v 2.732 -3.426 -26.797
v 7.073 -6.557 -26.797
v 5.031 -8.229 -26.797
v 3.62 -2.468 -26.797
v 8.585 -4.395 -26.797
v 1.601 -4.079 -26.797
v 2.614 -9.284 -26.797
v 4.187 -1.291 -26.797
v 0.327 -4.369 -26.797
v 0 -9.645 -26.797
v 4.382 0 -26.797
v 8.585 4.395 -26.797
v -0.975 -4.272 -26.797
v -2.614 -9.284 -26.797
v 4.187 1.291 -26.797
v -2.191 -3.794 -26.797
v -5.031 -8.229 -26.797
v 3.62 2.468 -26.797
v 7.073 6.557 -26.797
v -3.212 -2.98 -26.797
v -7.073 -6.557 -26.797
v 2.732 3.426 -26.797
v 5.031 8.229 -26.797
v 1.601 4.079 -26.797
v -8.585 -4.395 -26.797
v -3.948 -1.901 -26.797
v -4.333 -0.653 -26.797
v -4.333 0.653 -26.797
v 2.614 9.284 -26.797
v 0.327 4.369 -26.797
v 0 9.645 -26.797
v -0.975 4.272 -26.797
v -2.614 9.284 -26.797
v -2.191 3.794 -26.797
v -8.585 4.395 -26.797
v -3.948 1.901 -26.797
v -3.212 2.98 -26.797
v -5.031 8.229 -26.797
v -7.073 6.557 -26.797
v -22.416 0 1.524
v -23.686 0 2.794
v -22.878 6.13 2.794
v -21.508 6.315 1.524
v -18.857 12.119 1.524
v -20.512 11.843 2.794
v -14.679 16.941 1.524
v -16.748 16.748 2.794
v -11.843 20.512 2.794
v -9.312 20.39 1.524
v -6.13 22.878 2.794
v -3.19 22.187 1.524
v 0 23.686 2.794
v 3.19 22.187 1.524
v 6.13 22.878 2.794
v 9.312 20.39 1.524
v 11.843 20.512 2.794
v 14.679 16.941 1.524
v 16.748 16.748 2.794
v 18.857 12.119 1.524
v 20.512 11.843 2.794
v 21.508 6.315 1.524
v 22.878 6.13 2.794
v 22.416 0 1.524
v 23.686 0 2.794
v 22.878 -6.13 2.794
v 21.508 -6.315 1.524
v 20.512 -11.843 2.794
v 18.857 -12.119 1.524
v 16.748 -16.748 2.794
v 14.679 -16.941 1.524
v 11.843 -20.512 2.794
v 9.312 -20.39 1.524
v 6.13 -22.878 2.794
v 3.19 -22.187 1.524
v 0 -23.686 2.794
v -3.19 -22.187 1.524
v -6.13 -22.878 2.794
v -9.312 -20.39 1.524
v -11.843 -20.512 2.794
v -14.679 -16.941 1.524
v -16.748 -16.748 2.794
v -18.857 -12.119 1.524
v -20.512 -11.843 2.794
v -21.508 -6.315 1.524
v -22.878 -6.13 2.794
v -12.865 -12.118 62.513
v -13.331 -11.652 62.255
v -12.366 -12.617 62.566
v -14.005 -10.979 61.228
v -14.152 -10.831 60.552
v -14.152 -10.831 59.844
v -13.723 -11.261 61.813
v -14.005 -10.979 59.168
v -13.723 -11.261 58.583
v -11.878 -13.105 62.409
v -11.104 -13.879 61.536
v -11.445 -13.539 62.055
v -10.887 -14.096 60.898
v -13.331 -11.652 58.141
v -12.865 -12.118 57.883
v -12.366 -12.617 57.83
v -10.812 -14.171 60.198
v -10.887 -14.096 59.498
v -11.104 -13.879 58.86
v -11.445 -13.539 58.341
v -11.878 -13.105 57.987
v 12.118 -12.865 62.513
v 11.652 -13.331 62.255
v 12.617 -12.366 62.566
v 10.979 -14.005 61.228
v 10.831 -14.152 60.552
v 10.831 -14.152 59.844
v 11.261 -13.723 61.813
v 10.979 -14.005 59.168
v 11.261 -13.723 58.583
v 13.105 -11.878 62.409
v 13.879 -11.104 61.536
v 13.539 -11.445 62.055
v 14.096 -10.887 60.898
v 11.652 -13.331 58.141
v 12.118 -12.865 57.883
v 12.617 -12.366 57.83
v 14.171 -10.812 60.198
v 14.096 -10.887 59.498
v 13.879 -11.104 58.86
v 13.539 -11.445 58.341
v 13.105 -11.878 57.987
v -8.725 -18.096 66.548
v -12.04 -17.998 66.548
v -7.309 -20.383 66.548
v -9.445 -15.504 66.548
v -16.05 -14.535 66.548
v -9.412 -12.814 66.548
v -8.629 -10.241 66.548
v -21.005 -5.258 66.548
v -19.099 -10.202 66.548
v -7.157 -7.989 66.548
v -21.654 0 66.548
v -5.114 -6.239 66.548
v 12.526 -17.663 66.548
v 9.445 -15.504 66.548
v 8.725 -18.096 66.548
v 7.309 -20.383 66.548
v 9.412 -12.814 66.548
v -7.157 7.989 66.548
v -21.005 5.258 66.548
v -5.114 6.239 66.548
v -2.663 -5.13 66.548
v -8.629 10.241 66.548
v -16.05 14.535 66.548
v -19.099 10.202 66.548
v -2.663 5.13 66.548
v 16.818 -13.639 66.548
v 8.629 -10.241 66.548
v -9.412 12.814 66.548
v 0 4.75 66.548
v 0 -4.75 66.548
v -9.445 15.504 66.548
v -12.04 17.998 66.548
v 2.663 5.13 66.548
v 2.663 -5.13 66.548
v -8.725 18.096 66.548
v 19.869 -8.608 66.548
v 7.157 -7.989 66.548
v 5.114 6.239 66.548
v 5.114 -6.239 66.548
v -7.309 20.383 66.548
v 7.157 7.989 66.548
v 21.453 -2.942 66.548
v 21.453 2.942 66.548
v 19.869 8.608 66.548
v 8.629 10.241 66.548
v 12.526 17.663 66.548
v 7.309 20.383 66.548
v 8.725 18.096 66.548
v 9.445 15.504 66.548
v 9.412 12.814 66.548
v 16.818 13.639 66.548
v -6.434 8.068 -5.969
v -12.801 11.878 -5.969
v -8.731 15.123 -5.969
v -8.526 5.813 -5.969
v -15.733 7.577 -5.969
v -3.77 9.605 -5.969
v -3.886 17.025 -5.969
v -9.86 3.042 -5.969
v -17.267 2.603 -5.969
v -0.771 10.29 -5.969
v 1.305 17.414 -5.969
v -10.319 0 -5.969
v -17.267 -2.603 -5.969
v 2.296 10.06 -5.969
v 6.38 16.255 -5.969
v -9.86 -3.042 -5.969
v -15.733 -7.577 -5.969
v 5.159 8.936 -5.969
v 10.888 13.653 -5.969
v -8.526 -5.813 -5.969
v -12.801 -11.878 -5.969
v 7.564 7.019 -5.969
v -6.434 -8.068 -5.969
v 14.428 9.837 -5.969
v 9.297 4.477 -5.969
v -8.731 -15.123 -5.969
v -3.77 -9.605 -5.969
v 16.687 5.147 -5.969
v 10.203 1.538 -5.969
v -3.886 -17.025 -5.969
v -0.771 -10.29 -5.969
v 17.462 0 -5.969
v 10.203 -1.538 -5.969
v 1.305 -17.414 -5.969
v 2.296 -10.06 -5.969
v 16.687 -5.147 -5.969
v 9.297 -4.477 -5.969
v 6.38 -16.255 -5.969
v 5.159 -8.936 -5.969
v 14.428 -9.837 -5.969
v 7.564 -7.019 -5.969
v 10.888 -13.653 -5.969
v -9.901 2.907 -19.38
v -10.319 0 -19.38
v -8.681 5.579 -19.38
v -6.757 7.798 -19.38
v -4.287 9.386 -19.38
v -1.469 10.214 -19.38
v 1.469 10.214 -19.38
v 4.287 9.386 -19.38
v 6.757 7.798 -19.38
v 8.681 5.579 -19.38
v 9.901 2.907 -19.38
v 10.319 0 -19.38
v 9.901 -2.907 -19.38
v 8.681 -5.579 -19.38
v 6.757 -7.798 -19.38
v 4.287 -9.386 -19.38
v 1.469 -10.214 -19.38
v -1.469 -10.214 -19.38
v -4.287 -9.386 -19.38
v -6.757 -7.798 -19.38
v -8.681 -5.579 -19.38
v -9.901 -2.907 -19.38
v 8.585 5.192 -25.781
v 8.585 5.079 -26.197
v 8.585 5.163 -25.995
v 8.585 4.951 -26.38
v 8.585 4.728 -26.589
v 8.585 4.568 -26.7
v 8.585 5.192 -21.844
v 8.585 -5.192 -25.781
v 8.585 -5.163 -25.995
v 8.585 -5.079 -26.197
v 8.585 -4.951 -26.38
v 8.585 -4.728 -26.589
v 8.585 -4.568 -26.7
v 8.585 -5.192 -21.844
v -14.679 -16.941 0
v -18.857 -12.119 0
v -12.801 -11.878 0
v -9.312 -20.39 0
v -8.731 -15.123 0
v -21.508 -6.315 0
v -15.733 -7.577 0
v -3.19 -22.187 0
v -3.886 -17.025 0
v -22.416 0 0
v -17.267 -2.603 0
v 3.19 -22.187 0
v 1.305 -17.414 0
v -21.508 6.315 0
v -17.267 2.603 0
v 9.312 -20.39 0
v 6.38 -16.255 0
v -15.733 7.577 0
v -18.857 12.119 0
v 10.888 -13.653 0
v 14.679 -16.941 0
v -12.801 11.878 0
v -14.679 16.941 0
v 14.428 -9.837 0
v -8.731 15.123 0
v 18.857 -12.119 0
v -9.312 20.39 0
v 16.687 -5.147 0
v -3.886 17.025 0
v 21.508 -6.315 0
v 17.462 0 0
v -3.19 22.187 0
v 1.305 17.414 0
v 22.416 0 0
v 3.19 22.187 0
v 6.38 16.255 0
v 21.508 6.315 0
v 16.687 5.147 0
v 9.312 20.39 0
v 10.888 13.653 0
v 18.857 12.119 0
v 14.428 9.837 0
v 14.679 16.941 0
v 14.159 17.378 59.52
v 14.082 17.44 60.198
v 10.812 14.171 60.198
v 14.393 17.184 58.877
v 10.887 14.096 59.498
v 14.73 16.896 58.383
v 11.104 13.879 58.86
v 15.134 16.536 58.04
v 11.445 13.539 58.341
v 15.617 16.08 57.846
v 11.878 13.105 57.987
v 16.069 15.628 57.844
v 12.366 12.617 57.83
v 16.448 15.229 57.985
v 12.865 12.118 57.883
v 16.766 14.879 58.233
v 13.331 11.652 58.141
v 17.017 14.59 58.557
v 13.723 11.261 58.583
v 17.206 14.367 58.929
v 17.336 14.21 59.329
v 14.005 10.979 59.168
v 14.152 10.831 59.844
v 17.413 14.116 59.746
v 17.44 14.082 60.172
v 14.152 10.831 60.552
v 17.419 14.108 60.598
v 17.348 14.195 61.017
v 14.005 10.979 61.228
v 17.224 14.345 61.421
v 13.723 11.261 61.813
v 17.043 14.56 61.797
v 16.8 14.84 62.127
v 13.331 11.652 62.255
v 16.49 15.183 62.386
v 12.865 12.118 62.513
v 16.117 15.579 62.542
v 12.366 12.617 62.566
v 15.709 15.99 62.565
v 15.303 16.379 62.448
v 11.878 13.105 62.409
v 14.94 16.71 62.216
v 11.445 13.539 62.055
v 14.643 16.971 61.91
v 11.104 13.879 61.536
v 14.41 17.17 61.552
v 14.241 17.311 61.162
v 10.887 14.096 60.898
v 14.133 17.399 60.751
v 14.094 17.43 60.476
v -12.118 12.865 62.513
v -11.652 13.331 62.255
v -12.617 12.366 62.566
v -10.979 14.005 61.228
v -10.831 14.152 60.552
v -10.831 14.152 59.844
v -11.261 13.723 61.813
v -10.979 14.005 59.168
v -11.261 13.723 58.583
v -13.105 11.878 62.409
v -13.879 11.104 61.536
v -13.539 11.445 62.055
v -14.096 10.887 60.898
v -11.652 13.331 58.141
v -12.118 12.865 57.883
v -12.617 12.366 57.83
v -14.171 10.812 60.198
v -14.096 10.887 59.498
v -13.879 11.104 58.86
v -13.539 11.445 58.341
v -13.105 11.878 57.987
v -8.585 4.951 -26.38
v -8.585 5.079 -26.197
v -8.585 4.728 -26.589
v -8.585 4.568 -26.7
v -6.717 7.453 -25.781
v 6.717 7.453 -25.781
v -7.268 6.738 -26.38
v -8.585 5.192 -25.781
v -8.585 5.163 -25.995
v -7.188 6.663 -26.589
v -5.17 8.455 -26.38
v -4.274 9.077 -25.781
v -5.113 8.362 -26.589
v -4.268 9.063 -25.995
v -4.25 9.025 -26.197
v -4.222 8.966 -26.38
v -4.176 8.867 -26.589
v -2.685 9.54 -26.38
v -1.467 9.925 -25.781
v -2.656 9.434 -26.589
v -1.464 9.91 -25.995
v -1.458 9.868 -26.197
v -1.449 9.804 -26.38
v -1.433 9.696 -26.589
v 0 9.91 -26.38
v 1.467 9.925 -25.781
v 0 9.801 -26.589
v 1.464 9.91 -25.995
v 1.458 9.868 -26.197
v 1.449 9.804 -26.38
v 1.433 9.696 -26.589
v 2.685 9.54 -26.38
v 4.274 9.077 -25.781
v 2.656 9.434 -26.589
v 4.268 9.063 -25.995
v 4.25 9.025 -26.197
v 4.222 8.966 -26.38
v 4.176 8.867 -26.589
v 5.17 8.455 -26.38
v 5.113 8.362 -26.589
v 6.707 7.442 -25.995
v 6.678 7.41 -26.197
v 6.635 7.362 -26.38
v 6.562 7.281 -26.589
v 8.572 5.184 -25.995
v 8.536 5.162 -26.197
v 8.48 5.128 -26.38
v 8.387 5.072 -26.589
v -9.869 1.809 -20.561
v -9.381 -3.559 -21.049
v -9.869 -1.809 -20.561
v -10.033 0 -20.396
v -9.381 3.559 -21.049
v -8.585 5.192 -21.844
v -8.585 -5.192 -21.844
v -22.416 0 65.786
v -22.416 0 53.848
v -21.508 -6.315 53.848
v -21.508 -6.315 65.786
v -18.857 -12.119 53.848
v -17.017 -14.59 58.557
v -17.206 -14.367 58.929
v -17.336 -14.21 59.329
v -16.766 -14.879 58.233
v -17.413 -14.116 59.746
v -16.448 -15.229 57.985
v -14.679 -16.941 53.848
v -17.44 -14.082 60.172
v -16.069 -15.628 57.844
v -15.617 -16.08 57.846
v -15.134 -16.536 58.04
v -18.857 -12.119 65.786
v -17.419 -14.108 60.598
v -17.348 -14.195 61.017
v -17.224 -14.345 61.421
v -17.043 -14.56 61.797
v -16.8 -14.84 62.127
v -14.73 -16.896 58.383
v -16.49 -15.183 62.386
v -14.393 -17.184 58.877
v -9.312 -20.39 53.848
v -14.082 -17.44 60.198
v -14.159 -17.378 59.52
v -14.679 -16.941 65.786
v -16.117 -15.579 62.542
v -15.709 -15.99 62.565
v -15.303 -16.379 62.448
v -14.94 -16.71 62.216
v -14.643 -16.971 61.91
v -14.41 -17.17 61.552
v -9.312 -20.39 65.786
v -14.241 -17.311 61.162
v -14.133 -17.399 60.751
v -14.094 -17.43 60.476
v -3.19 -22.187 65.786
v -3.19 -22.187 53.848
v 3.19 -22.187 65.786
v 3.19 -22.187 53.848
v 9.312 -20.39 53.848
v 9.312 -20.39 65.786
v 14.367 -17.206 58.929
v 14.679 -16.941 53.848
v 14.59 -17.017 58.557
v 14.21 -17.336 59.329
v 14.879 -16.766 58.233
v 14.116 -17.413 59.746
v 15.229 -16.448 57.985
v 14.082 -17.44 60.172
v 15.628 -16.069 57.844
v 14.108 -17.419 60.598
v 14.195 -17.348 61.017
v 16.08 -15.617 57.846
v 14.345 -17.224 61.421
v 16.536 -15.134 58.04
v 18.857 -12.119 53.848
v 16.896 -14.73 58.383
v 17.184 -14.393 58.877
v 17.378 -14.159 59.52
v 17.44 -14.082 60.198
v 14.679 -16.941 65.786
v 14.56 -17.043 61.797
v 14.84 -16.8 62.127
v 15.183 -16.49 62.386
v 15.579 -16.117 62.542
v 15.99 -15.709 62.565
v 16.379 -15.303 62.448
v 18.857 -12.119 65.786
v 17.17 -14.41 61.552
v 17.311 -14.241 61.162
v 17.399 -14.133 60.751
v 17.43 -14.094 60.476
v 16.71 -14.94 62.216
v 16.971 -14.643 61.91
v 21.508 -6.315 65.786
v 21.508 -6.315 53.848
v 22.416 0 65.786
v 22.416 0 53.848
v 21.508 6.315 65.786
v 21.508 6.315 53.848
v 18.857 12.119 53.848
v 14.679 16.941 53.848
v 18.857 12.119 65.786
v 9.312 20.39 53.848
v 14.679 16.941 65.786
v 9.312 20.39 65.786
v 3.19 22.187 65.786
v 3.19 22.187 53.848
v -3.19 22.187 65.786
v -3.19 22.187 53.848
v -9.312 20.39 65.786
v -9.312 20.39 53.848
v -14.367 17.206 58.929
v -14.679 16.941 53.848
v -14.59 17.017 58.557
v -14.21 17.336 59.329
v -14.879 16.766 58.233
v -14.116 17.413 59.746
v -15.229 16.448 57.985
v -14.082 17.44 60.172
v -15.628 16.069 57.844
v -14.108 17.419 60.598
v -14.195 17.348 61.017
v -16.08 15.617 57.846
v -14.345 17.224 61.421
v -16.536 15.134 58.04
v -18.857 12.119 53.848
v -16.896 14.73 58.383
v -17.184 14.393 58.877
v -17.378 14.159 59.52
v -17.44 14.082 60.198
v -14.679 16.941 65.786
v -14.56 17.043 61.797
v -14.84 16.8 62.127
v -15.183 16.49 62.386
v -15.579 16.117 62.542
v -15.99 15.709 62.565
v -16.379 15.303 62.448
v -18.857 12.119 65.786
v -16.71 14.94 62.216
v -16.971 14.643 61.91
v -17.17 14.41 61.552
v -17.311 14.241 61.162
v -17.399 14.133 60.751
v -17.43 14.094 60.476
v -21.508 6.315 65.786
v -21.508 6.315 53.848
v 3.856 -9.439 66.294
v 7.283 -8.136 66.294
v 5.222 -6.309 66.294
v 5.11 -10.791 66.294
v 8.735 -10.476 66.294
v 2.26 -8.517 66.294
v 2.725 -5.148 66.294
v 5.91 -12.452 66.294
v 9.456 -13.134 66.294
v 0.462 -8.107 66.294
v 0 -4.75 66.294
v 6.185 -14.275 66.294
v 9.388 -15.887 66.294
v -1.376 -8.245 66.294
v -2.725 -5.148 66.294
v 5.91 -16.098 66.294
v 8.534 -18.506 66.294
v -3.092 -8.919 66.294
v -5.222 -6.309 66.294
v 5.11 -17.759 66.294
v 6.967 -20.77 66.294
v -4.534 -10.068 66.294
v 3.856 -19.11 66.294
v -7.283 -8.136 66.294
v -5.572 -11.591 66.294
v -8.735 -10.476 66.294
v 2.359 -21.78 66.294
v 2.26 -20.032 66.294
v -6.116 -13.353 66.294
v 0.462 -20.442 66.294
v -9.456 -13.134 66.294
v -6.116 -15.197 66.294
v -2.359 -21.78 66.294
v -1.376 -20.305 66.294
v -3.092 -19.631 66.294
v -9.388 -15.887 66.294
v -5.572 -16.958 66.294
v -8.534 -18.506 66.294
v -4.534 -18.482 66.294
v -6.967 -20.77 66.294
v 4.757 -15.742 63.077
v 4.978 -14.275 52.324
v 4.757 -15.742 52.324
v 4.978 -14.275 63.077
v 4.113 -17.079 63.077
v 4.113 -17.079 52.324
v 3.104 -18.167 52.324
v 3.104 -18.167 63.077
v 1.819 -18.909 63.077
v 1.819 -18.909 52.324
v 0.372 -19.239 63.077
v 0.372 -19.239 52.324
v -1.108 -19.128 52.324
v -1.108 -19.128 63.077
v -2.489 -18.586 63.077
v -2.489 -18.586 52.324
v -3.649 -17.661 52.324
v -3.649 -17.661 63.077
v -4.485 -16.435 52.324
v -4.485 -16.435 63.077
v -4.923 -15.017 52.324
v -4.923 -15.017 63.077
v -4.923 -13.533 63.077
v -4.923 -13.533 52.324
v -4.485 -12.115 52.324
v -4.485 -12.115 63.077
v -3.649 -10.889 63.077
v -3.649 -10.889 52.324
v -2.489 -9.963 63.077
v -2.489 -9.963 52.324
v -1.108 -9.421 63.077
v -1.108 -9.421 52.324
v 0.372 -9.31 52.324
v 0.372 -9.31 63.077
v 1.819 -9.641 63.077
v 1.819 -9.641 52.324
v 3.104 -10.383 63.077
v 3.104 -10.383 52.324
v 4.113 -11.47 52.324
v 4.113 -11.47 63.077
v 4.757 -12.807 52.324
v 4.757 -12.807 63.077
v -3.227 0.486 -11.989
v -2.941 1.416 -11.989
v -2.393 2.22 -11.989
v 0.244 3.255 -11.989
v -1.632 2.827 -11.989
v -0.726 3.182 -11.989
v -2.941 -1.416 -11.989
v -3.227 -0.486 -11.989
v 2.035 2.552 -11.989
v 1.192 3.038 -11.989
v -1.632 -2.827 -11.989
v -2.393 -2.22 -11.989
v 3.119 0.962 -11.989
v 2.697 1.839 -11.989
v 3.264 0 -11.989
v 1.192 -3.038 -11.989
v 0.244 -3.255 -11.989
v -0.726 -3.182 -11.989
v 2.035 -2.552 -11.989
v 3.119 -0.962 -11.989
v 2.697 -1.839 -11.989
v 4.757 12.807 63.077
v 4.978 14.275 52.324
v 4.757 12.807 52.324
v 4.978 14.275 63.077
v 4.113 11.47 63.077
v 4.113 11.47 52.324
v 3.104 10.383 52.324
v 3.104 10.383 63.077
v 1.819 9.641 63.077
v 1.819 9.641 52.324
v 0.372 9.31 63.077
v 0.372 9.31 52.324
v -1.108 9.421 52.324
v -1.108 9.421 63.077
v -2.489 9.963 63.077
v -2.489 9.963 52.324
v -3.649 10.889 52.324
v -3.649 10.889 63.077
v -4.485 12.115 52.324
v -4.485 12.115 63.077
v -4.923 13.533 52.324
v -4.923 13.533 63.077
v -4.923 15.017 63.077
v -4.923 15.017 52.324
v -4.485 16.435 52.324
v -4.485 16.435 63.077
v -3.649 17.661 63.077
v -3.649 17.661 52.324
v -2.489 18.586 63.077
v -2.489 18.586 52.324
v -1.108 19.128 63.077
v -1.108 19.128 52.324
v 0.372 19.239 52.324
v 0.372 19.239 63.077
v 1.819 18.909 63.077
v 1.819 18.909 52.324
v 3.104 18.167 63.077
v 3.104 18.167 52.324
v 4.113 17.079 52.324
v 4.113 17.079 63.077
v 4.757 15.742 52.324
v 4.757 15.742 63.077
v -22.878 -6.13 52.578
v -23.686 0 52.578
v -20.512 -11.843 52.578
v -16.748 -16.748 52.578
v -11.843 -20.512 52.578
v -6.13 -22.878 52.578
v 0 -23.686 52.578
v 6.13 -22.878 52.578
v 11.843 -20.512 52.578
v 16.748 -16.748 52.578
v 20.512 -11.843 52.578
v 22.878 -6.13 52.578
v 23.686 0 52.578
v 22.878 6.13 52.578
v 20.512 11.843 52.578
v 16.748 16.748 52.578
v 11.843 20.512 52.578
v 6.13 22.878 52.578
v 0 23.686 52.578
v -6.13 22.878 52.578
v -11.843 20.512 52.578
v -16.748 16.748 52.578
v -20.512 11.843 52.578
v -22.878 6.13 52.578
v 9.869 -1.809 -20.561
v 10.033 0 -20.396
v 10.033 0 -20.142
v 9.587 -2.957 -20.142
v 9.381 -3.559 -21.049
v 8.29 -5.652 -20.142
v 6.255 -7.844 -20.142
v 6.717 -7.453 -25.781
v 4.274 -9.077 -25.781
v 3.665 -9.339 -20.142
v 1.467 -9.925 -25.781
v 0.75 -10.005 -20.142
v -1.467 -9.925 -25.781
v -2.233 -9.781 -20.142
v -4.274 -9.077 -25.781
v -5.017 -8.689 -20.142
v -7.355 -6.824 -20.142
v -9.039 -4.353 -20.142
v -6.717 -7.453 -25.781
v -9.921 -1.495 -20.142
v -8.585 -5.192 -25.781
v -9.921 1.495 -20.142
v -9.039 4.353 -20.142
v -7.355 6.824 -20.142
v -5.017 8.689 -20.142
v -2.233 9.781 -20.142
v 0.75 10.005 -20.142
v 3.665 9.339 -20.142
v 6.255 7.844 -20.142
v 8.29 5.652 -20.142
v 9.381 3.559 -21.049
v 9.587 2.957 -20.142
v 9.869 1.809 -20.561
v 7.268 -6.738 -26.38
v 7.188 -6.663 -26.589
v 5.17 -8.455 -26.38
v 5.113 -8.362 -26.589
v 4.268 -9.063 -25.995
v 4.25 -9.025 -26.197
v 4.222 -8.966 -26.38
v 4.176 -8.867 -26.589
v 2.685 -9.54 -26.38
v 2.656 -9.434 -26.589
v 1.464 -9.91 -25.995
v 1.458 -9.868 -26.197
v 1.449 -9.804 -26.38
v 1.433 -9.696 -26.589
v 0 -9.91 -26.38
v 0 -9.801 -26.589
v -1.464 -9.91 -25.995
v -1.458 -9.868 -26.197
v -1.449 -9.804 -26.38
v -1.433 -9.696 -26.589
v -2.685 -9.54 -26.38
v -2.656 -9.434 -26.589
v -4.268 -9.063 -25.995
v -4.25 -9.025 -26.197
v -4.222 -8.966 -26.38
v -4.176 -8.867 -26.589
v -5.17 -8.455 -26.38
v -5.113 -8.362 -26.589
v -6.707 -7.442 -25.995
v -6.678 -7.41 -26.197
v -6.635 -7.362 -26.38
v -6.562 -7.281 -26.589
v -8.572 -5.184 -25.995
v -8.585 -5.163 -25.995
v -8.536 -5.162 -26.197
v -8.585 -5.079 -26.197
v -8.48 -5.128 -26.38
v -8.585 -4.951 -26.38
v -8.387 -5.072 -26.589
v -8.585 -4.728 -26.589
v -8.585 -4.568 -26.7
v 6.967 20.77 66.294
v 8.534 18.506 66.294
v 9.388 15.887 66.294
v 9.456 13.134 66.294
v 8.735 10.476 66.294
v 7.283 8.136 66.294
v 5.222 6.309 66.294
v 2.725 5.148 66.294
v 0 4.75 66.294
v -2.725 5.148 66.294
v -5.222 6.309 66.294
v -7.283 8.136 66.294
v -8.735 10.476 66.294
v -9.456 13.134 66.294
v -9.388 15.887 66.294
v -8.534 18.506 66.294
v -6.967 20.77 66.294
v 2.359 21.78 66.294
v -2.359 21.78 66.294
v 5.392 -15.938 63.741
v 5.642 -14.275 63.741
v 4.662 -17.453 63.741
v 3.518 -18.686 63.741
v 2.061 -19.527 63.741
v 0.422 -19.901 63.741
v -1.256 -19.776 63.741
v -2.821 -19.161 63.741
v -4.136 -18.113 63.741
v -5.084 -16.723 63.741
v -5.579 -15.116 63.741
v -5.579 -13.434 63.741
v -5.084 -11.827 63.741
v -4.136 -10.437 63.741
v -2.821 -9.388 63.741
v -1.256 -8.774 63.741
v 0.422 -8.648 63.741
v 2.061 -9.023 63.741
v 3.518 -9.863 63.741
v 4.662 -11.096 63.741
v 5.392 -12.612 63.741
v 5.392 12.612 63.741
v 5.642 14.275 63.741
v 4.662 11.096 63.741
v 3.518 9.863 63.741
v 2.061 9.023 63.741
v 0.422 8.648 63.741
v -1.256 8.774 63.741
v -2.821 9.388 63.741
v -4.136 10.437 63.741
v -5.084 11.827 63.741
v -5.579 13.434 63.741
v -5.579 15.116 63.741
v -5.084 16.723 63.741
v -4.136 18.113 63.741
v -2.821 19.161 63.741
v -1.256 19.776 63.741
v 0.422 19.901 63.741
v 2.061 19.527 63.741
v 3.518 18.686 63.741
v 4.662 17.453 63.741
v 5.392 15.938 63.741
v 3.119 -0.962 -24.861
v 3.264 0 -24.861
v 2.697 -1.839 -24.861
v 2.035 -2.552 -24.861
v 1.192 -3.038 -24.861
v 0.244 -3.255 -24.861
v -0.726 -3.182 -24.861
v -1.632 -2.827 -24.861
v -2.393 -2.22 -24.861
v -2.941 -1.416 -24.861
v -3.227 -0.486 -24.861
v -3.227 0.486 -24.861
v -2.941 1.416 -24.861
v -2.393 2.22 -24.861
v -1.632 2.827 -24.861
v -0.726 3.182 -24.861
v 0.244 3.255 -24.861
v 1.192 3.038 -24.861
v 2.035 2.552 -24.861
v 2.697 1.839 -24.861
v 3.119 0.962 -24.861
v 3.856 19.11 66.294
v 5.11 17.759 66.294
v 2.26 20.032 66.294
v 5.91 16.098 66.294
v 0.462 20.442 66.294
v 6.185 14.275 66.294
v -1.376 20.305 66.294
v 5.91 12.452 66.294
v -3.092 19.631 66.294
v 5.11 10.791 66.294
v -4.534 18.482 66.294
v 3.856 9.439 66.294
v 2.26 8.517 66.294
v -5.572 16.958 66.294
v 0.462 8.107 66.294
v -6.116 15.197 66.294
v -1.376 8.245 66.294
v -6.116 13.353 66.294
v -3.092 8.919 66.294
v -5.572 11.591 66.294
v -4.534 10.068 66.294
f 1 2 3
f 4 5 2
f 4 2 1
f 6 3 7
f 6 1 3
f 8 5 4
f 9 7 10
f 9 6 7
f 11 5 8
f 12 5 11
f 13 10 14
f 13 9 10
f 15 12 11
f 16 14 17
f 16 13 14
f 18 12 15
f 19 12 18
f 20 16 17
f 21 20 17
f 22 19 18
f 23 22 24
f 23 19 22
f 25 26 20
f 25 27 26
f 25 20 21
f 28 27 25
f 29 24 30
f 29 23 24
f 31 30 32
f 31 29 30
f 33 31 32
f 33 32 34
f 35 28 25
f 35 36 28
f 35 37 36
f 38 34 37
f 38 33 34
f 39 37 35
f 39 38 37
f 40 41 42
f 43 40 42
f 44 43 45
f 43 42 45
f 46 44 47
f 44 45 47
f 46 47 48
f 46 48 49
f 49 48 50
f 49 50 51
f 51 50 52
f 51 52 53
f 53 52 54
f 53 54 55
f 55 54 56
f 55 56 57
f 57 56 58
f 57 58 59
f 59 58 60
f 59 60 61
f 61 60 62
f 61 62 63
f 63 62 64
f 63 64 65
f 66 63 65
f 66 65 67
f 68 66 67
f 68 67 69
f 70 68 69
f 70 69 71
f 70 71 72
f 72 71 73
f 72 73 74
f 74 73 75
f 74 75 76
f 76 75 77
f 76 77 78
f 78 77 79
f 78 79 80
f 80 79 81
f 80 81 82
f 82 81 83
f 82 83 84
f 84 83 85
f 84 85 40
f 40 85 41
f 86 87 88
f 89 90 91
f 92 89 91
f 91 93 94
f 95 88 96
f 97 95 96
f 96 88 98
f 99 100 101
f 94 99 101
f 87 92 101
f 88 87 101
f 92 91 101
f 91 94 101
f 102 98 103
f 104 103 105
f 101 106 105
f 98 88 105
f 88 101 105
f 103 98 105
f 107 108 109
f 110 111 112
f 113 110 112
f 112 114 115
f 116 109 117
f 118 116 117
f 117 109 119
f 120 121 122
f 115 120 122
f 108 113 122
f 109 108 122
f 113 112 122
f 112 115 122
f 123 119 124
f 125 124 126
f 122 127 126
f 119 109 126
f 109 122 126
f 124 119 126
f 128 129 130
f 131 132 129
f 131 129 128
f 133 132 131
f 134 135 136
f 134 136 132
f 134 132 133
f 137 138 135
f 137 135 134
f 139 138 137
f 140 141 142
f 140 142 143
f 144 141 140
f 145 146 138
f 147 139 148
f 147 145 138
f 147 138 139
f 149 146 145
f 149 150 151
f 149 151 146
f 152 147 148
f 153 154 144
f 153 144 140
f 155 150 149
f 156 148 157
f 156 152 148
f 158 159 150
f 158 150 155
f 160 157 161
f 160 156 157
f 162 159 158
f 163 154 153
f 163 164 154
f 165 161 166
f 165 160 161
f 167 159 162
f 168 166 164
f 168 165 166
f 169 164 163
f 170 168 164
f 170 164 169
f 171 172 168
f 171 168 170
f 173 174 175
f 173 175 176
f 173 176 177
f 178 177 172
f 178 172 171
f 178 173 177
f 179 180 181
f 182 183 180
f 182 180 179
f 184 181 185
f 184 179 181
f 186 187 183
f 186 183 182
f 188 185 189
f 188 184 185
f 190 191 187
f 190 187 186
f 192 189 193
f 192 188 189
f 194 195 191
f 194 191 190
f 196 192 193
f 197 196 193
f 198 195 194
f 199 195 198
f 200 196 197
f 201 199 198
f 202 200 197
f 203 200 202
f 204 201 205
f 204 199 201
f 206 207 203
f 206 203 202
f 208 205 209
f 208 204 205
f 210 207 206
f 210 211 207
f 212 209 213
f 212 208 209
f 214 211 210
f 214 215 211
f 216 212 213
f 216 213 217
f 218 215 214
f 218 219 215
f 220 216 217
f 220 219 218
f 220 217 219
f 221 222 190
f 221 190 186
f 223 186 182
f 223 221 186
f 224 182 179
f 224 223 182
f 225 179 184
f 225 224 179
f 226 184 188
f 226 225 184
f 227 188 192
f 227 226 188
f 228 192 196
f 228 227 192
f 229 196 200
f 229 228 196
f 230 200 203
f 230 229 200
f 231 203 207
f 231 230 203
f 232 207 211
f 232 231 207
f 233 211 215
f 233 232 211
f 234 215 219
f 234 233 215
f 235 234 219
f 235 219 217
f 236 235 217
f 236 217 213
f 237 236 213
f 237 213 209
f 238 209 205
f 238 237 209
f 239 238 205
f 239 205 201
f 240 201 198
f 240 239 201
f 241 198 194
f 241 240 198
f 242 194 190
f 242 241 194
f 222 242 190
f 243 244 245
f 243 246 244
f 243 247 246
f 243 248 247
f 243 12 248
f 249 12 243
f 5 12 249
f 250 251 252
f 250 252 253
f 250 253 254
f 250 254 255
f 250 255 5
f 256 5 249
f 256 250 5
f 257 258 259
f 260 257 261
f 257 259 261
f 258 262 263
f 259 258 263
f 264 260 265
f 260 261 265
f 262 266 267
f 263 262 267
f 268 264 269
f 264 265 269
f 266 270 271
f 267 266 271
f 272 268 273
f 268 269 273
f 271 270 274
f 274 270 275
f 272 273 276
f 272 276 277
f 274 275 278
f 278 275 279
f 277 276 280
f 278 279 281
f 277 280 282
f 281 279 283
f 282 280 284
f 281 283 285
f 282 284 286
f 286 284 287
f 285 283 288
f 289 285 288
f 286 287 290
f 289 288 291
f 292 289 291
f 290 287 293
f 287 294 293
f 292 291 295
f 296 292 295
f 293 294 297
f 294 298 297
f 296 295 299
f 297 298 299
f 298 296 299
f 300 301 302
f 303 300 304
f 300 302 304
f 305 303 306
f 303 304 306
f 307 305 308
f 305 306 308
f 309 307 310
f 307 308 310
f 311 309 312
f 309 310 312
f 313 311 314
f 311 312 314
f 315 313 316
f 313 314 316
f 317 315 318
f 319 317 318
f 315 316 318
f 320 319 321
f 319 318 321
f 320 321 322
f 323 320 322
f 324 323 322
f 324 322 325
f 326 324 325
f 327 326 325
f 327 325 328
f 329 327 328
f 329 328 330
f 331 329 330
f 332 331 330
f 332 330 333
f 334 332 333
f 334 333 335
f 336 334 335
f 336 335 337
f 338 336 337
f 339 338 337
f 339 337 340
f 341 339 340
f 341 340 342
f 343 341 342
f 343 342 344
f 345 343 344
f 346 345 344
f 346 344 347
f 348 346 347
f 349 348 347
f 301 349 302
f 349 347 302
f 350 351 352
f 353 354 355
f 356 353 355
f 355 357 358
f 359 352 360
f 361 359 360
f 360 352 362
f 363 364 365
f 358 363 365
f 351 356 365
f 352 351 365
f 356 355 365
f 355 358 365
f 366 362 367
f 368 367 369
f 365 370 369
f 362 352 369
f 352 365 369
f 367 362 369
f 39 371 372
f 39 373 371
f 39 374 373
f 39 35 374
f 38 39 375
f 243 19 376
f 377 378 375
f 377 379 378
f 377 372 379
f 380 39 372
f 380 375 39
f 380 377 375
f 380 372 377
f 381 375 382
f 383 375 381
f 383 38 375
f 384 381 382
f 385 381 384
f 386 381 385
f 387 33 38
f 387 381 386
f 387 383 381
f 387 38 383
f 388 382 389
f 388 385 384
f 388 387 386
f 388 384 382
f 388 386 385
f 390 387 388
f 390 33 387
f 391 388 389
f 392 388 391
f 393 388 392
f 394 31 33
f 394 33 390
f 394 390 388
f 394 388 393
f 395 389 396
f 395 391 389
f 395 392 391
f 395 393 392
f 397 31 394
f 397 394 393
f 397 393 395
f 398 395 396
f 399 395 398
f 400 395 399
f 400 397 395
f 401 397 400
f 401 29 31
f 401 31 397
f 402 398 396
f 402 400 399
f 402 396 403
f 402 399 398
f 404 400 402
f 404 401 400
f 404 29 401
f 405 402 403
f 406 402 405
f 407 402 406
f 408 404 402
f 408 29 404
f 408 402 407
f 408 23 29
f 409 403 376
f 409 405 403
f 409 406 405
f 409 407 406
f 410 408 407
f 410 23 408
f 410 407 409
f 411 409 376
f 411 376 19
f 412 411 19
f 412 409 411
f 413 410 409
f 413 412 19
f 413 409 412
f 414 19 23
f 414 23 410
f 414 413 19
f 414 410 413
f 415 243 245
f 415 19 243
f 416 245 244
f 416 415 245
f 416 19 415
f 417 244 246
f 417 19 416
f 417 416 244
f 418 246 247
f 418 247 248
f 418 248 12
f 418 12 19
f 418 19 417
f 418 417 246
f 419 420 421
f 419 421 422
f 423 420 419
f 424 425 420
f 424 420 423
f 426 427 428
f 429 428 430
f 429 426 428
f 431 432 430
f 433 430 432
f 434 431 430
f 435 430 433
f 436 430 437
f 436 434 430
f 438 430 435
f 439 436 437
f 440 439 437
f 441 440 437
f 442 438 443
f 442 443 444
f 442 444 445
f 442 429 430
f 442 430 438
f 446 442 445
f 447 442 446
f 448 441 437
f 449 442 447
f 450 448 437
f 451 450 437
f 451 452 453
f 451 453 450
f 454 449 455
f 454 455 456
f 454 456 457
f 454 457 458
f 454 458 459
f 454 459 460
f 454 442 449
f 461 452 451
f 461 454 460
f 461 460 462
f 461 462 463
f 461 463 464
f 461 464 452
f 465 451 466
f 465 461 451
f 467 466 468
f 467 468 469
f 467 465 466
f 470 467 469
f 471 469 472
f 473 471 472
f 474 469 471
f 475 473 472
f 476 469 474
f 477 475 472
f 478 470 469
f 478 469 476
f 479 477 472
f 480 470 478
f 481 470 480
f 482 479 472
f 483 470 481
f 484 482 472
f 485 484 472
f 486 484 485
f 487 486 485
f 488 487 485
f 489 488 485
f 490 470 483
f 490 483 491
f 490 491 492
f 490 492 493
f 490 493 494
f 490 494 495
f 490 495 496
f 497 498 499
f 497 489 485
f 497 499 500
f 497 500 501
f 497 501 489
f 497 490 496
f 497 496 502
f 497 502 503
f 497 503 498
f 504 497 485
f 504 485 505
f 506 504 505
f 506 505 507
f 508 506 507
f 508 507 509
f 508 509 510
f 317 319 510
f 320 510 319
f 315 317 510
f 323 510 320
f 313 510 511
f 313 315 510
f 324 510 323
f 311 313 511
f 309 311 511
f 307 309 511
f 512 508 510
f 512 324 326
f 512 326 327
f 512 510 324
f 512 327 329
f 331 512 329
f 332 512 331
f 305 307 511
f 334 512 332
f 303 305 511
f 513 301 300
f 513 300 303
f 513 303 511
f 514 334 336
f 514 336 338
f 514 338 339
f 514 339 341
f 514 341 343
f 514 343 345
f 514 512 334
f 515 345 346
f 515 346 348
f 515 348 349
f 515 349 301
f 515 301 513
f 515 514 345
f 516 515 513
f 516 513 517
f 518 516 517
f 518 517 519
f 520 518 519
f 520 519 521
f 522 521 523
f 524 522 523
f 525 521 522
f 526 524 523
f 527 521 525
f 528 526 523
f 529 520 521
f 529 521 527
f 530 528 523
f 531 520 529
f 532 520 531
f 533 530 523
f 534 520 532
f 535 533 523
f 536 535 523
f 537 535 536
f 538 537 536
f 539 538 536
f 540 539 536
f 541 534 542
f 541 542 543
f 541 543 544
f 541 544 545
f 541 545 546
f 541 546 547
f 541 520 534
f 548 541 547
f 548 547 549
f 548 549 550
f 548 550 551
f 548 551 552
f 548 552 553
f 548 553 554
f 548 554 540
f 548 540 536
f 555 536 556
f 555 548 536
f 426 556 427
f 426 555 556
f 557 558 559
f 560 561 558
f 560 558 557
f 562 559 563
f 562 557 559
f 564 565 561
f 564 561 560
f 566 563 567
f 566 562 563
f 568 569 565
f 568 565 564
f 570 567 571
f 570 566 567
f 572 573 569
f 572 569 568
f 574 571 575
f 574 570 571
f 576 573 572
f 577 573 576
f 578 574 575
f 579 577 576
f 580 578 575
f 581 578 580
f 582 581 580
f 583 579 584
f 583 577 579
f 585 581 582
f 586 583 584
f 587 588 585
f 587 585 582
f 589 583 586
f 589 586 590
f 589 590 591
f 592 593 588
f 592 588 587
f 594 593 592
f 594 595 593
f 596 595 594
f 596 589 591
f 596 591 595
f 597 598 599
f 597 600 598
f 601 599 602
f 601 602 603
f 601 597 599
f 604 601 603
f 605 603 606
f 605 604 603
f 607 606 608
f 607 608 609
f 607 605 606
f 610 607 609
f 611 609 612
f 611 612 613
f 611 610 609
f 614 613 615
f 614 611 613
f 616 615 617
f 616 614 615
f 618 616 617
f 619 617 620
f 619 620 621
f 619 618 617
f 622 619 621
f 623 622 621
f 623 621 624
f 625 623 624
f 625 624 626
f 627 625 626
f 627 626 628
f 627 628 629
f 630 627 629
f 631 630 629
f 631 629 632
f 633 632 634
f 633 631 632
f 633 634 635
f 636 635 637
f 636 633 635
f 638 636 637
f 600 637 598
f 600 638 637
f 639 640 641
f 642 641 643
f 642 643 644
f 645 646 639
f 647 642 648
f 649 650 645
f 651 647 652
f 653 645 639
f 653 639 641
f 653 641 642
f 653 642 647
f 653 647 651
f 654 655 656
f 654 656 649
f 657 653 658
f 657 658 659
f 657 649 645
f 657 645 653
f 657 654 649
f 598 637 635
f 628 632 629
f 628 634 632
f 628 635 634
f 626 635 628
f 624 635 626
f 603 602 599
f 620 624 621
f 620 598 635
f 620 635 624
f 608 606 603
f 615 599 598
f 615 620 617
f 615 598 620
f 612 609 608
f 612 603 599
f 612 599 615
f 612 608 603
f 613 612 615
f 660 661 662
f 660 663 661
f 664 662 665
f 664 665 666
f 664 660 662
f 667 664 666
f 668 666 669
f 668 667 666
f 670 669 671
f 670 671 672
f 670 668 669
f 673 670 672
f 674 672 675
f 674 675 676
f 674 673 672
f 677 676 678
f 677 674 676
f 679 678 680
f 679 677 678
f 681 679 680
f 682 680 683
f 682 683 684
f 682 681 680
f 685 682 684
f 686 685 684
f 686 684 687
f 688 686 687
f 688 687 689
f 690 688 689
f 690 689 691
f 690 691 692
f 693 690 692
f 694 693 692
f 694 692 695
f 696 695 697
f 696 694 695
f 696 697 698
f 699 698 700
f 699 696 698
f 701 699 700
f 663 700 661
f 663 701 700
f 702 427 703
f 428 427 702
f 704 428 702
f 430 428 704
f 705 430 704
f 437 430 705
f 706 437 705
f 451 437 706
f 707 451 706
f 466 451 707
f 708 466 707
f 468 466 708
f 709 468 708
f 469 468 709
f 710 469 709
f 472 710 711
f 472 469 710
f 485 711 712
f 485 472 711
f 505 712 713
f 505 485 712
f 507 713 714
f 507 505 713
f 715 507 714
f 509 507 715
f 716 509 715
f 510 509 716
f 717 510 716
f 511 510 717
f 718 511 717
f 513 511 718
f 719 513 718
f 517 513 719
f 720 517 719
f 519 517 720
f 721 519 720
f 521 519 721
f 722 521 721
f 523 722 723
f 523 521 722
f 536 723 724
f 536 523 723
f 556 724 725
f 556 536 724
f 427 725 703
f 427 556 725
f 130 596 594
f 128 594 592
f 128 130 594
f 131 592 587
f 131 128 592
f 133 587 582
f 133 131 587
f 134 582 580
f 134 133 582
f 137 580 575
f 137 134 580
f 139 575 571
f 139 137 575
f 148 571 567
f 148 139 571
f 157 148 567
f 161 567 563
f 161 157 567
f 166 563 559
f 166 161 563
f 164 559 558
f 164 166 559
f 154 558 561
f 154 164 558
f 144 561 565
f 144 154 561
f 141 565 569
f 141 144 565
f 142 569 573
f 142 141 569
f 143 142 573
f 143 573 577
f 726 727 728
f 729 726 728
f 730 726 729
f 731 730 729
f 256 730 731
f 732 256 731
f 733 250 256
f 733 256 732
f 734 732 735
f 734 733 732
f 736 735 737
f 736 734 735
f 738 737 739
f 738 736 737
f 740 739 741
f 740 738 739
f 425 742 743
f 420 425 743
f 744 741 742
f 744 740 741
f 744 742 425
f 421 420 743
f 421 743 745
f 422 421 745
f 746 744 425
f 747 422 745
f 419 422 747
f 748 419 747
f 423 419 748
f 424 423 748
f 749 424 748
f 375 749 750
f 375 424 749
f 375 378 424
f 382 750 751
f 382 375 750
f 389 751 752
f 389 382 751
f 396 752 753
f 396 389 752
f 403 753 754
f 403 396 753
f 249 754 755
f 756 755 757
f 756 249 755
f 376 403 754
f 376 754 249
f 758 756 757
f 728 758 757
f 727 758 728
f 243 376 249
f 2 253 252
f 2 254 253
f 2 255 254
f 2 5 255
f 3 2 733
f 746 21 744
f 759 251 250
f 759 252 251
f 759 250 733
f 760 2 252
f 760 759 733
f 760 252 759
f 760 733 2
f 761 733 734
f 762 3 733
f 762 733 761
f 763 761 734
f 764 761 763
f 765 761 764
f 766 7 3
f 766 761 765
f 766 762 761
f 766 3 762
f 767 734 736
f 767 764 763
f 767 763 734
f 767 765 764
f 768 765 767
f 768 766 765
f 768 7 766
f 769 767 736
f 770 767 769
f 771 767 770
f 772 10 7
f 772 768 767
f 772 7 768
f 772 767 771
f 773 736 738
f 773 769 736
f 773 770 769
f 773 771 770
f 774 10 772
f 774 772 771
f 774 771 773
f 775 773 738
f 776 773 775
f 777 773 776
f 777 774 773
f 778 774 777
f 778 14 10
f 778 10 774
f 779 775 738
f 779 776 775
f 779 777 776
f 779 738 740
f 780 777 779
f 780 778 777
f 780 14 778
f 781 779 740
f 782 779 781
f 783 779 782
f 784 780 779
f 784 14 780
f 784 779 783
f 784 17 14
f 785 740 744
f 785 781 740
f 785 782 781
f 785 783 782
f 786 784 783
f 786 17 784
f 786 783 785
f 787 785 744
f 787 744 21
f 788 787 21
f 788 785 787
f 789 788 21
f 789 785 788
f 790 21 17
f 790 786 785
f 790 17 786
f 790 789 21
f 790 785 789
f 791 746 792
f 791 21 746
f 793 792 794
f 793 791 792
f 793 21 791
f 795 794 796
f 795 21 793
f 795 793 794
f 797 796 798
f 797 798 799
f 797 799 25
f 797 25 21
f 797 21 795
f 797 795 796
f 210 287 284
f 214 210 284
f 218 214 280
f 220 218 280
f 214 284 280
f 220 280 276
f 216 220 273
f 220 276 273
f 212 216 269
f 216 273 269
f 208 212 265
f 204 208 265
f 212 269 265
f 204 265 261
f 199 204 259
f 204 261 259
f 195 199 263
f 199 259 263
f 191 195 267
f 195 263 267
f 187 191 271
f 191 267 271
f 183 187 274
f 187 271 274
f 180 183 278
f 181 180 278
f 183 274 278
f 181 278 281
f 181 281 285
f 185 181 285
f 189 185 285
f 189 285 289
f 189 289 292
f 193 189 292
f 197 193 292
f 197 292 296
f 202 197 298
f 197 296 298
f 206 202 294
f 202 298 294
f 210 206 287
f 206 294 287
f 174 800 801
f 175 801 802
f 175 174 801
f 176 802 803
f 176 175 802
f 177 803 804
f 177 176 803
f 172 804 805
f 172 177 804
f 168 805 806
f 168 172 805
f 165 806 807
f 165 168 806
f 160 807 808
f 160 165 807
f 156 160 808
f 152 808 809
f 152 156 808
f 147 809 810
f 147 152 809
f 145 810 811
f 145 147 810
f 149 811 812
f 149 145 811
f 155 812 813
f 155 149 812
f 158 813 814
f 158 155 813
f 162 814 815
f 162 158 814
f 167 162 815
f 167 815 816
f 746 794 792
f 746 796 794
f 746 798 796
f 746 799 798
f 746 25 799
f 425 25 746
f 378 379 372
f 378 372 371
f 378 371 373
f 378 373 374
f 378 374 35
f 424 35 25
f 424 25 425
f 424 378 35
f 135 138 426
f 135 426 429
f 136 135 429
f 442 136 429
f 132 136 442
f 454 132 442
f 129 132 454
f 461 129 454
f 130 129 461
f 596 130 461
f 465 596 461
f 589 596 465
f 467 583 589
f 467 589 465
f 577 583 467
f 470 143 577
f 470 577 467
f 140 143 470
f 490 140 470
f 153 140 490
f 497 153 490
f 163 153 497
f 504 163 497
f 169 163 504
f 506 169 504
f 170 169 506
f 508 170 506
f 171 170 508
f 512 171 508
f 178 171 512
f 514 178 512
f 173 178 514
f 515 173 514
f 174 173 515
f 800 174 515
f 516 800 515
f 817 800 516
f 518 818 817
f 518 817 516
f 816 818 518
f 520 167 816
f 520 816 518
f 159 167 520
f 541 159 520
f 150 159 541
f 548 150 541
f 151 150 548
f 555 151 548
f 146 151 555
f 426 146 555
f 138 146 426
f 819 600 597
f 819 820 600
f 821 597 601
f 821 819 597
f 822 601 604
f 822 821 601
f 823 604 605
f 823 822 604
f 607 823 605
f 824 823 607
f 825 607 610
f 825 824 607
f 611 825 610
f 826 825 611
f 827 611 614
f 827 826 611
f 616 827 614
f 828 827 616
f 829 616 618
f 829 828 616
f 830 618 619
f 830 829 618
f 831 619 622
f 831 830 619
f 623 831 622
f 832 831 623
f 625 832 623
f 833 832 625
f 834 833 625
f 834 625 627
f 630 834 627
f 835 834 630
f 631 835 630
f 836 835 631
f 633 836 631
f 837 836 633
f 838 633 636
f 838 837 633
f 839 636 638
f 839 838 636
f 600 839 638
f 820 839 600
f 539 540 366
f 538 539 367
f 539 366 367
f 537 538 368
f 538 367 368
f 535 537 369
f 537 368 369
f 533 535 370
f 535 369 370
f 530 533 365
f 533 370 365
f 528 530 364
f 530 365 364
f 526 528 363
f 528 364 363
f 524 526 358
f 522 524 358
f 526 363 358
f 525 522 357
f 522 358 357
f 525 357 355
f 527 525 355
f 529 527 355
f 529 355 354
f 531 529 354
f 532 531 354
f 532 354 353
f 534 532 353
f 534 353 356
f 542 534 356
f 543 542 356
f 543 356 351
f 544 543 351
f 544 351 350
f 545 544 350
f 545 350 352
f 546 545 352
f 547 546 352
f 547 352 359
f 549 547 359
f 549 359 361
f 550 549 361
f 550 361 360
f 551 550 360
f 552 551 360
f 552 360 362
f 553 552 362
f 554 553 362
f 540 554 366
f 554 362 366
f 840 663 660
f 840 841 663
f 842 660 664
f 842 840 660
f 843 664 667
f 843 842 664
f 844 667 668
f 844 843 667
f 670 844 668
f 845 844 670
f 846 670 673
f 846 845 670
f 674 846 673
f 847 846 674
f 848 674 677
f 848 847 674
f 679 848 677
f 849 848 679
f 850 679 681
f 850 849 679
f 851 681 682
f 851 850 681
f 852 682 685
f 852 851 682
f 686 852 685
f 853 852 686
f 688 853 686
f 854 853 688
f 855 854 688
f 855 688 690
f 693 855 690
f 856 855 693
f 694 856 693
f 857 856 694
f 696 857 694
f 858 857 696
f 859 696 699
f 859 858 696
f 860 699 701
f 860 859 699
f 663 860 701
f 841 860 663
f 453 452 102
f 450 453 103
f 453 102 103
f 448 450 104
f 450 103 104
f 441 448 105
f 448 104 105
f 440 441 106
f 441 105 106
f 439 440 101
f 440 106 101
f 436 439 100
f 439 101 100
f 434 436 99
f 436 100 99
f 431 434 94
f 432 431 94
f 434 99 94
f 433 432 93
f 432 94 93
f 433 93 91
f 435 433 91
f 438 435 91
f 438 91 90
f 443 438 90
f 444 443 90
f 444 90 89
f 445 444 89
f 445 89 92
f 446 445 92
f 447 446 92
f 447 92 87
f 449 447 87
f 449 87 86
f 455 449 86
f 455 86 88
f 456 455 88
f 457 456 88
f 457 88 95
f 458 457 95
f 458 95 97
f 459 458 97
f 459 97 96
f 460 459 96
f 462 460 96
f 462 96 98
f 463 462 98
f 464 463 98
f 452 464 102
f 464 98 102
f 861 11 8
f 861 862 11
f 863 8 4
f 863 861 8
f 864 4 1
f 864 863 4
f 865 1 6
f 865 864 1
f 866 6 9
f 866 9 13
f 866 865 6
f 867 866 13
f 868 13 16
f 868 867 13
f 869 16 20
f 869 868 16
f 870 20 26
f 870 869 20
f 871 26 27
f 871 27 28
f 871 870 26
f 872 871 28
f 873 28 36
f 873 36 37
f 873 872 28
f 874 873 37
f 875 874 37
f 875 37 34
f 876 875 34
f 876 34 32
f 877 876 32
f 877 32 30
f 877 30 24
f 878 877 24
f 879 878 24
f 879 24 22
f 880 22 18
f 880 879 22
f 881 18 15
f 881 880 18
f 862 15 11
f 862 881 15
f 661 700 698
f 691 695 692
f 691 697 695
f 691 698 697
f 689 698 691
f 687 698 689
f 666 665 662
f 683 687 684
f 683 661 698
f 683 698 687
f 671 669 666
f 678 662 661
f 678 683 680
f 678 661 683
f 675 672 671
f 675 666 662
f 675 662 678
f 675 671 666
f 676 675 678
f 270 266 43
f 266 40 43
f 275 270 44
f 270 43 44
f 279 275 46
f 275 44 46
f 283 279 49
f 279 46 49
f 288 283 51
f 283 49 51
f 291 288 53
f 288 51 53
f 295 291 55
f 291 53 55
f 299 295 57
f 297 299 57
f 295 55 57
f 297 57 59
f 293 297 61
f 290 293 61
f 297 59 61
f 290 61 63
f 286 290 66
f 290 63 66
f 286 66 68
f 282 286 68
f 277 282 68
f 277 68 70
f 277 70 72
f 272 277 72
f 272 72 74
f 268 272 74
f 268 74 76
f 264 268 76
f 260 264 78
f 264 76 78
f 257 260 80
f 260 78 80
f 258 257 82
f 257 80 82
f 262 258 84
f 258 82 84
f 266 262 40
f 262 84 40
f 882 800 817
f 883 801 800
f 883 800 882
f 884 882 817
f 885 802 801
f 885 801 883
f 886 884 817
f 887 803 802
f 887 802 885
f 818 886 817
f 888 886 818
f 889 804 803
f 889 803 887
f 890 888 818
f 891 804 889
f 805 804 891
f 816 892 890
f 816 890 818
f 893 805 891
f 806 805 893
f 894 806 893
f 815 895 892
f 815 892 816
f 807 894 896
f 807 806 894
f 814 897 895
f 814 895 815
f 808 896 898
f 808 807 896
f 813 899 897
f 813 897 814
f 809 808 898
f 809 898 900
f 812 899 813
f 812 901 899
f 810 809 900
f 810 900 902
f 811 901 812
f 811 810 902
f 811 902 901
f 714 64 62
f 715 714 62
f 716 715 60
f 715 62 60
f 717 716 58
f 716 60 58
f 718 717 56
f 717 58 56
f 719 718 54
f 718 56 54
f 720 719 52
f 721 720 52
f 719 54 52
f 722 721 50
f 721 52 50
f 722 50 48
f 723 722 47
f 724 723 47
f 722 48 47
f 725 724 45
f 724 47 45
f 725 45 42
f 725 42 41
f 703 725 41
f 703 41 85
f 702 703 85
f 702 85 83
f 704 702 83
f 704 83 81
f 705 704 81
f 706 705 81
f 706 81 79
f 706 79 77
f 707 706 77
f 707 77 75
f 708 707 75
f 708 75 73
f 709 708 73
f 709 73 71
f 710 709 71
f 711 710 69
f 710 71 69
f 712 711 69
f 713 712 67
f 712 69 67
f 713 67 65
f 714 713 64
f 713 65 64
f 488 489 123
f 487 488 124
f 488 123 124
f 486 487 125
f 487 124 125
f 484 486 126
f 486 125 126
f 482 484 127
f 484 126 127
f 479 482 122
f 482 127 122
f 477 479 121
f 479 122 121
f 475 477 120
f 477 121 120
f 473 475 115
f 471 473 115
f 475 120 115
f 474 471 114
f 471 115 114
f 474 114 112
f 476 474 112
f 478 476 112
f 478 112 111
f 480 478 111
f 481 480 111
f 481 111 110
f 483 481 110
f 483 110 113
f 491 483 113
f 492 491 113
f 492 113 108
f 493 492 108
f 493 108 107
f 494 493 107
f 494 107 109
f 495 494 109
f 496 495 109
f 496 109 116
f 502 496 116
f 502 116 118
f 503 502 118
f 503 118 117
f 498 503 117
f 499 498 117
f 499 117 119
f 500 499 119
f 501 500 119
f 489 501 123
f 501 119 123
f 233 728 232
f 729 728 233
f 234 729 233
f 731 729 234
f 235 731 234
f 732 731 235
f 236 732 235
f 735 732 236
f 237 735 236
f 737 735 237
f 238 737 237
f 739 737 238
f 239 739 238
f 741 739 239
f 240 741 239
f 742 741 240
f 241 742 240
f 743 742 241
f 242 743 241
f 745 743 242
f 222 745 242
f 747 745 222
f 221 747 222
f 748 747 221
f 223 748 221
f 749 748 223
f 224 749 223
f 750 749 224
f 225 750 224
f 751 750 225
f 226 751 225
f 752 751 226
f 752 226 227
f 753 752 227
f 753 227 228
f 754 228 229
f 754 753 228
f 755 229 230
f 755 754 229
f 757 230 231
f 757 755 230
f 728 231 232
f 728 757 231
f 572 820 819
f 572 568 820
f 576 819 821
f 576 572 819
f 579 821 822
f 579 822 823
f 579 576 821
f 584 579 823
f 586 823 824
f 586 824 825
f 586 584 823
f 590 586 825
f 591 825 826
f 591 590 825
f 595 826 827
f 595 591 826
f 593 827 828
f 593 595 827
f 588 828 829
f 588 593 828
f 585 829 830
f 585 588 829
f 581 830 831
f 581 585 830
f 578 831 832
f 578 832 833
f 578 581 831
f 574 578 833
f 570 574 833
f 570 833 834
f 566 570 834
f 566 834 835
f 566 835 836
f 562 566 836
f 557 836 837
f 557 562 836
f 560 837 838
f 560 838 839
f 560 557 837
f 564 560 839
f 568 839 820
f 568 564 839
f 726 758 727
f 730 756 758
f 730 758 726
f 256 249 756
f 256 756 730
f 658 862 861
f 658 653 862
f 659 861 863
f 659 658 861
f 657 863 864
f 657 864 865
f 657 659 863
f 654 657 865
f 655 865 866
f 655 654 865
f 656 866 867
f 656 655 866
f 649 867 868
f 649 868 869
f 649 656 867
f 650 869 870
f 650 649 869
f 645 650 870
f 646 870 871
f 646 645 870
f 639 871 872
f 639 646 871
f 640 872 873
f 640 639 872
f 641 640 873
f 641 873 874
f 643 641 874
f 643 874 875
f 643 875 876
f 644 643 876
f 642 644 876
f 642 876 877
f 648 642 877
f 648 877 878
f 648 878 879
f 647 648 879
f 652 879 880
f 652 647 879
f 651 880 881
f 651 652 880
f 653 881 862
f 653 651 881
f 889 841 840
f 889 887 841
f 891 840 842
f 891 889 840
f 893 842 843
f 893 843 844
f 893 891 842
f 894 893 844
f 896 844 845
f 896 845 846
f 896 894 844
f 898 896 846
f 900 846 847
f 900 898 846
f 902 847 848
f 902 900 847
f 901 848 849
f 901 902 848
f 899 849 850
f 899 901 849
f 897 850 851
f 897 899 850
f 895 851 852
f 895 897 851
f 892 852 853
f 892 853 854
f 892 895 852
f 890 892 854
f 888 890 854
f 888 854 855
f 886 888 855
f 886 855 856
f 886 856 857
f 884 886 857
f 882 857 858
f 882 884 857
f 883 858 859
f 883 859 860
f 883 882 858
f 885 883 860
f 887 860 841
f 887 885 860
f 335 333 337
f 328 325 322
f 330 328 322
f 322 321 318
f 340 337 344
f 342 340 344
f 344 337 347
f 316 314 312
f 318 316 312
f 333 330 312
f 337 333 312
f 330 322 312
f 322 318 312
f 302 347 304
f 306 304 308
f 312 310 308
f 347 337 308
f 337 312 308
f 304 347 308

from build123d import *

# Parameters (mm, degrees)
SKETCH1_R          = 23.6855
EXTRUDE1_DEPTH     = 66.548
CHAMFER1_SIZE      = 0.762
SKETCH6_R          = 17.4625
EXTRUDE2_DEPTH     = 5.969
SKETCH7_W          = 20.828
SKETCH7_H          = 10.31875
CUT_EXTRUDE4_DEPTH = 19.84248
HOLE1_D            = 4.7498
HOLE1_DEPTH        = 4.7498
CIRPATTERN1_COUNT  = 4
LPATTERN1_COUNT    = 2
LPATTERN1_PITCH    = 28.5496


with BuildPart() as part:
    # Sketch1 → Extrude1 (new body)
    with BuildSketch(Plane.XY):
        Circle(SKETCH1_R)
    extrude(amount=EXTRUDE1_DEPTH)

    # Sketch2 → Cut-Revolve1 (revolve, cut)
    with BuildSketch(Plane(origin=(0, 0, 0), x_dir=(1, 0, 0), z_dir=(0, 1, 0)), mode=Mode.PRIVATE) as cut_revolve1_sk:
        Polygon((23.6855, -66.548), (23.6855, -52.578), (22.4155, -53.848), (22.4155, -66.548), align=None)
    revolve(cut_revolve1_sk.sketch.rotate(Axis((0, 0, 0), (0, 0, 1)), 180), axis=Axis((0, 0, 0), (0, 0, 1)), mode=Mode.SUBTRACT)  # turned: the seam where the file's is

    # Sketch3 → Cut-Revolve2 (revolve, cut)
    with BuildSketch(Plane(origin=(0, 0, 0), x_dir=(1, 0, 0), z_dir=(0, 1, 0)), mode=Mode.PRIVATE) as cut_revolve2_sk:
        Polygon((22.4155, 0), (22.4155, -1.524), (23.6855, -2.794), (23.6855, 0), align=None)
    revolve(cut_revolve2_sk.sketch.rotate(Axis((0, 0, 0), (0, 0, -1)), 180), axis=Axis((0, 0, 0), (0, 0, -1)), mode=Mode.SUBTRACT)  # turned: the seam where the file's is

    # Chamfer1
    chamfer1_edges = [part.edges().sort_by_distance(p)[0] for p in [
        (22.4155, 0, 66.548),
    ]]
    chamfer(chamfer1_edges, length=CHAMFER1_SIZE)

    # S2D0002 → Cut-Revolve3 (revolve, cut)
    with BuildSketch(Plane(origin=(0, 0, 0), x_dir=(0, -1, 0), z_dir=(1, 0, 0)), mode=Mode.PRIVATE) as cut_revolve3_sk:
        Polygon((20.4597, -66.294), (23.7998, -66.294), (23.7998, -66.548), (14.2748, -66.548), (14.2748, -52.324), (19.2532, -52.324), (19.2532, -63.077393135), (19.917106865, -63.7413), align=None)
    cut_revolve3 = revolve(cut_revolve3_sk.sketch.rotate(Axis((0, -14.2748, 14.6685), (0, 0, -1)), 270), axis=Axis((0, -14.2748, 14.6685), (0, 0, -1)), mode=Mode.SUBTRACT)  # turned: the seam where the file's is

    # Sketch6 → Extrude2 (add)
    with BuildSketch(Plane(origin=(0, 0, 0), x_dir=(-1, 0, 0), z_dir=(0, 0, -1))):
        with Locations(Location((0, 0, 0), (0, 0, 180))):  # turned: the seam where the file's is
            Circle(SKETCH6_R)
    extrude(amount=EXTRUDE2_DEPTH)

    # Sketch7 → Revolve1 (revolve)
    with BuildSketch(Plane(origin=(0, 0, 0), x_dir=(0, 0, -1), z_dir=(1, 0, 0)), mode=Mode.PRIVATE) as revolve1_sk:
        with Locations((16.383, -5.159375)):
            Rectangle(SKETCH7_W, SKETCH7_H)
    revolve(revolve1_sk.sketch.rotate(Axis((0, 0, 0), (0, 0, -1)), 90), axis=Axis((0, 0, 0), (0, 0, -1)))  # turned: the seam where the file's is

    # S2D0001 → Cut-Revolve5 (revolve, cut)
    with BuildSketch(Plane(origin=(0, 0, 0), x_dir=(1, 0, 0), z_dir=(0, 1, 0))):
        Polygon((3.2639, 24.861260017), (3.2639, 11.9888), (0, 11.9888), (0, 26.797), (4.3815, 26.797), align=None)
    revolve(axis=Axis((0, 0, 31.308359971), (0, 0, -1)), mode=Mode.SUBTRACT)

    # Sketch9 → Cut-Revolve6 (revolve, cut)
    with BuildSketch(Plane(origin=(0, 0, 0), x_dir=(0, -1, 0), z_dir=(1, 0, 0)), mode=Mode.PRIVATE) as cut_revolve6_sk:
        with BuildLine():
            Line((-10.31875, 19.3802), (-10.033, 20.1422))
            Line((-10.033, 20.1422), (-10.033, 25.781))
            ThreePointArc((-10.033, 25.781), (-9.932678675, 26.324796865), (-9.644922533, 26.797))
            Line((-9.644922533, 26.797), (-10.31875, 26.797))
            Line((-10.31875, 26.797), (-10.31875, 19.3802))
        make_face()
    revolve(cut_revolve6_sk.sketch.rotate(Axis((0, 0, -12.65936), (0, 0, -1)), 90), axis=Axis((0, 0, -12.65936), (0, 0, -1)), mode=Mode.SUBTRACT)  # turned: the seam where the file's is

    # Sketch13 → Cut-Extrude4 (cut, symmetric)
    with BuildSketch(Plane(origin=(0, 0, 0), x_dir=(1, 0, 0), z_dir=(0, 1, 0))):
        Polygon((8.5852, 26.797), (8.5852, 21.844), (10.033, 20.3962), (10.033, 26.797), align=None)
        Polygon((-8.5852, 26.797), (-8.5852, 21.844), (-10.033, 20.3962), (-10.033, 26.797), align=None)
    extrude(amount=CUT_EXTRUDE4_DEPTH, both=True, mode=Mode.SUBTRACT)

    # Hole1
    with Locations(Plane(origin=(-15.850152054, 15.850152054, 60.198), x_dir=(0.707106781, 0.707106781, 0), z_dir=(-0.707106781, 0.707106781, 0))):
        with Locations((0, 0)):
            hole1 = Hole(HOLE1_D / 2, depth=HOLE1_DEPTH)

    # CirPattern1: Hole1 ×4 about axis
    cirpattern1_axis = Axis((0, 0, 0), (0, 0, 1))
    for i in range(1, CIRPATTERN1_COUNT):
        add(hole1.rotate(cirpattern1_axis, i * 360 / CIRPATTERN1_COUNT), mode=Mode.SUBTRACT)

    # LPattern1: Cut-Revolve3 ×2
    with Locations(*[(0, i * LPATTERN1_PITCH, 0) for i in range(1, LPATTERN1_COUNT)]):
        add(cut_revolve3, mode=Mode.SUBTRACT)


solid = part.part
